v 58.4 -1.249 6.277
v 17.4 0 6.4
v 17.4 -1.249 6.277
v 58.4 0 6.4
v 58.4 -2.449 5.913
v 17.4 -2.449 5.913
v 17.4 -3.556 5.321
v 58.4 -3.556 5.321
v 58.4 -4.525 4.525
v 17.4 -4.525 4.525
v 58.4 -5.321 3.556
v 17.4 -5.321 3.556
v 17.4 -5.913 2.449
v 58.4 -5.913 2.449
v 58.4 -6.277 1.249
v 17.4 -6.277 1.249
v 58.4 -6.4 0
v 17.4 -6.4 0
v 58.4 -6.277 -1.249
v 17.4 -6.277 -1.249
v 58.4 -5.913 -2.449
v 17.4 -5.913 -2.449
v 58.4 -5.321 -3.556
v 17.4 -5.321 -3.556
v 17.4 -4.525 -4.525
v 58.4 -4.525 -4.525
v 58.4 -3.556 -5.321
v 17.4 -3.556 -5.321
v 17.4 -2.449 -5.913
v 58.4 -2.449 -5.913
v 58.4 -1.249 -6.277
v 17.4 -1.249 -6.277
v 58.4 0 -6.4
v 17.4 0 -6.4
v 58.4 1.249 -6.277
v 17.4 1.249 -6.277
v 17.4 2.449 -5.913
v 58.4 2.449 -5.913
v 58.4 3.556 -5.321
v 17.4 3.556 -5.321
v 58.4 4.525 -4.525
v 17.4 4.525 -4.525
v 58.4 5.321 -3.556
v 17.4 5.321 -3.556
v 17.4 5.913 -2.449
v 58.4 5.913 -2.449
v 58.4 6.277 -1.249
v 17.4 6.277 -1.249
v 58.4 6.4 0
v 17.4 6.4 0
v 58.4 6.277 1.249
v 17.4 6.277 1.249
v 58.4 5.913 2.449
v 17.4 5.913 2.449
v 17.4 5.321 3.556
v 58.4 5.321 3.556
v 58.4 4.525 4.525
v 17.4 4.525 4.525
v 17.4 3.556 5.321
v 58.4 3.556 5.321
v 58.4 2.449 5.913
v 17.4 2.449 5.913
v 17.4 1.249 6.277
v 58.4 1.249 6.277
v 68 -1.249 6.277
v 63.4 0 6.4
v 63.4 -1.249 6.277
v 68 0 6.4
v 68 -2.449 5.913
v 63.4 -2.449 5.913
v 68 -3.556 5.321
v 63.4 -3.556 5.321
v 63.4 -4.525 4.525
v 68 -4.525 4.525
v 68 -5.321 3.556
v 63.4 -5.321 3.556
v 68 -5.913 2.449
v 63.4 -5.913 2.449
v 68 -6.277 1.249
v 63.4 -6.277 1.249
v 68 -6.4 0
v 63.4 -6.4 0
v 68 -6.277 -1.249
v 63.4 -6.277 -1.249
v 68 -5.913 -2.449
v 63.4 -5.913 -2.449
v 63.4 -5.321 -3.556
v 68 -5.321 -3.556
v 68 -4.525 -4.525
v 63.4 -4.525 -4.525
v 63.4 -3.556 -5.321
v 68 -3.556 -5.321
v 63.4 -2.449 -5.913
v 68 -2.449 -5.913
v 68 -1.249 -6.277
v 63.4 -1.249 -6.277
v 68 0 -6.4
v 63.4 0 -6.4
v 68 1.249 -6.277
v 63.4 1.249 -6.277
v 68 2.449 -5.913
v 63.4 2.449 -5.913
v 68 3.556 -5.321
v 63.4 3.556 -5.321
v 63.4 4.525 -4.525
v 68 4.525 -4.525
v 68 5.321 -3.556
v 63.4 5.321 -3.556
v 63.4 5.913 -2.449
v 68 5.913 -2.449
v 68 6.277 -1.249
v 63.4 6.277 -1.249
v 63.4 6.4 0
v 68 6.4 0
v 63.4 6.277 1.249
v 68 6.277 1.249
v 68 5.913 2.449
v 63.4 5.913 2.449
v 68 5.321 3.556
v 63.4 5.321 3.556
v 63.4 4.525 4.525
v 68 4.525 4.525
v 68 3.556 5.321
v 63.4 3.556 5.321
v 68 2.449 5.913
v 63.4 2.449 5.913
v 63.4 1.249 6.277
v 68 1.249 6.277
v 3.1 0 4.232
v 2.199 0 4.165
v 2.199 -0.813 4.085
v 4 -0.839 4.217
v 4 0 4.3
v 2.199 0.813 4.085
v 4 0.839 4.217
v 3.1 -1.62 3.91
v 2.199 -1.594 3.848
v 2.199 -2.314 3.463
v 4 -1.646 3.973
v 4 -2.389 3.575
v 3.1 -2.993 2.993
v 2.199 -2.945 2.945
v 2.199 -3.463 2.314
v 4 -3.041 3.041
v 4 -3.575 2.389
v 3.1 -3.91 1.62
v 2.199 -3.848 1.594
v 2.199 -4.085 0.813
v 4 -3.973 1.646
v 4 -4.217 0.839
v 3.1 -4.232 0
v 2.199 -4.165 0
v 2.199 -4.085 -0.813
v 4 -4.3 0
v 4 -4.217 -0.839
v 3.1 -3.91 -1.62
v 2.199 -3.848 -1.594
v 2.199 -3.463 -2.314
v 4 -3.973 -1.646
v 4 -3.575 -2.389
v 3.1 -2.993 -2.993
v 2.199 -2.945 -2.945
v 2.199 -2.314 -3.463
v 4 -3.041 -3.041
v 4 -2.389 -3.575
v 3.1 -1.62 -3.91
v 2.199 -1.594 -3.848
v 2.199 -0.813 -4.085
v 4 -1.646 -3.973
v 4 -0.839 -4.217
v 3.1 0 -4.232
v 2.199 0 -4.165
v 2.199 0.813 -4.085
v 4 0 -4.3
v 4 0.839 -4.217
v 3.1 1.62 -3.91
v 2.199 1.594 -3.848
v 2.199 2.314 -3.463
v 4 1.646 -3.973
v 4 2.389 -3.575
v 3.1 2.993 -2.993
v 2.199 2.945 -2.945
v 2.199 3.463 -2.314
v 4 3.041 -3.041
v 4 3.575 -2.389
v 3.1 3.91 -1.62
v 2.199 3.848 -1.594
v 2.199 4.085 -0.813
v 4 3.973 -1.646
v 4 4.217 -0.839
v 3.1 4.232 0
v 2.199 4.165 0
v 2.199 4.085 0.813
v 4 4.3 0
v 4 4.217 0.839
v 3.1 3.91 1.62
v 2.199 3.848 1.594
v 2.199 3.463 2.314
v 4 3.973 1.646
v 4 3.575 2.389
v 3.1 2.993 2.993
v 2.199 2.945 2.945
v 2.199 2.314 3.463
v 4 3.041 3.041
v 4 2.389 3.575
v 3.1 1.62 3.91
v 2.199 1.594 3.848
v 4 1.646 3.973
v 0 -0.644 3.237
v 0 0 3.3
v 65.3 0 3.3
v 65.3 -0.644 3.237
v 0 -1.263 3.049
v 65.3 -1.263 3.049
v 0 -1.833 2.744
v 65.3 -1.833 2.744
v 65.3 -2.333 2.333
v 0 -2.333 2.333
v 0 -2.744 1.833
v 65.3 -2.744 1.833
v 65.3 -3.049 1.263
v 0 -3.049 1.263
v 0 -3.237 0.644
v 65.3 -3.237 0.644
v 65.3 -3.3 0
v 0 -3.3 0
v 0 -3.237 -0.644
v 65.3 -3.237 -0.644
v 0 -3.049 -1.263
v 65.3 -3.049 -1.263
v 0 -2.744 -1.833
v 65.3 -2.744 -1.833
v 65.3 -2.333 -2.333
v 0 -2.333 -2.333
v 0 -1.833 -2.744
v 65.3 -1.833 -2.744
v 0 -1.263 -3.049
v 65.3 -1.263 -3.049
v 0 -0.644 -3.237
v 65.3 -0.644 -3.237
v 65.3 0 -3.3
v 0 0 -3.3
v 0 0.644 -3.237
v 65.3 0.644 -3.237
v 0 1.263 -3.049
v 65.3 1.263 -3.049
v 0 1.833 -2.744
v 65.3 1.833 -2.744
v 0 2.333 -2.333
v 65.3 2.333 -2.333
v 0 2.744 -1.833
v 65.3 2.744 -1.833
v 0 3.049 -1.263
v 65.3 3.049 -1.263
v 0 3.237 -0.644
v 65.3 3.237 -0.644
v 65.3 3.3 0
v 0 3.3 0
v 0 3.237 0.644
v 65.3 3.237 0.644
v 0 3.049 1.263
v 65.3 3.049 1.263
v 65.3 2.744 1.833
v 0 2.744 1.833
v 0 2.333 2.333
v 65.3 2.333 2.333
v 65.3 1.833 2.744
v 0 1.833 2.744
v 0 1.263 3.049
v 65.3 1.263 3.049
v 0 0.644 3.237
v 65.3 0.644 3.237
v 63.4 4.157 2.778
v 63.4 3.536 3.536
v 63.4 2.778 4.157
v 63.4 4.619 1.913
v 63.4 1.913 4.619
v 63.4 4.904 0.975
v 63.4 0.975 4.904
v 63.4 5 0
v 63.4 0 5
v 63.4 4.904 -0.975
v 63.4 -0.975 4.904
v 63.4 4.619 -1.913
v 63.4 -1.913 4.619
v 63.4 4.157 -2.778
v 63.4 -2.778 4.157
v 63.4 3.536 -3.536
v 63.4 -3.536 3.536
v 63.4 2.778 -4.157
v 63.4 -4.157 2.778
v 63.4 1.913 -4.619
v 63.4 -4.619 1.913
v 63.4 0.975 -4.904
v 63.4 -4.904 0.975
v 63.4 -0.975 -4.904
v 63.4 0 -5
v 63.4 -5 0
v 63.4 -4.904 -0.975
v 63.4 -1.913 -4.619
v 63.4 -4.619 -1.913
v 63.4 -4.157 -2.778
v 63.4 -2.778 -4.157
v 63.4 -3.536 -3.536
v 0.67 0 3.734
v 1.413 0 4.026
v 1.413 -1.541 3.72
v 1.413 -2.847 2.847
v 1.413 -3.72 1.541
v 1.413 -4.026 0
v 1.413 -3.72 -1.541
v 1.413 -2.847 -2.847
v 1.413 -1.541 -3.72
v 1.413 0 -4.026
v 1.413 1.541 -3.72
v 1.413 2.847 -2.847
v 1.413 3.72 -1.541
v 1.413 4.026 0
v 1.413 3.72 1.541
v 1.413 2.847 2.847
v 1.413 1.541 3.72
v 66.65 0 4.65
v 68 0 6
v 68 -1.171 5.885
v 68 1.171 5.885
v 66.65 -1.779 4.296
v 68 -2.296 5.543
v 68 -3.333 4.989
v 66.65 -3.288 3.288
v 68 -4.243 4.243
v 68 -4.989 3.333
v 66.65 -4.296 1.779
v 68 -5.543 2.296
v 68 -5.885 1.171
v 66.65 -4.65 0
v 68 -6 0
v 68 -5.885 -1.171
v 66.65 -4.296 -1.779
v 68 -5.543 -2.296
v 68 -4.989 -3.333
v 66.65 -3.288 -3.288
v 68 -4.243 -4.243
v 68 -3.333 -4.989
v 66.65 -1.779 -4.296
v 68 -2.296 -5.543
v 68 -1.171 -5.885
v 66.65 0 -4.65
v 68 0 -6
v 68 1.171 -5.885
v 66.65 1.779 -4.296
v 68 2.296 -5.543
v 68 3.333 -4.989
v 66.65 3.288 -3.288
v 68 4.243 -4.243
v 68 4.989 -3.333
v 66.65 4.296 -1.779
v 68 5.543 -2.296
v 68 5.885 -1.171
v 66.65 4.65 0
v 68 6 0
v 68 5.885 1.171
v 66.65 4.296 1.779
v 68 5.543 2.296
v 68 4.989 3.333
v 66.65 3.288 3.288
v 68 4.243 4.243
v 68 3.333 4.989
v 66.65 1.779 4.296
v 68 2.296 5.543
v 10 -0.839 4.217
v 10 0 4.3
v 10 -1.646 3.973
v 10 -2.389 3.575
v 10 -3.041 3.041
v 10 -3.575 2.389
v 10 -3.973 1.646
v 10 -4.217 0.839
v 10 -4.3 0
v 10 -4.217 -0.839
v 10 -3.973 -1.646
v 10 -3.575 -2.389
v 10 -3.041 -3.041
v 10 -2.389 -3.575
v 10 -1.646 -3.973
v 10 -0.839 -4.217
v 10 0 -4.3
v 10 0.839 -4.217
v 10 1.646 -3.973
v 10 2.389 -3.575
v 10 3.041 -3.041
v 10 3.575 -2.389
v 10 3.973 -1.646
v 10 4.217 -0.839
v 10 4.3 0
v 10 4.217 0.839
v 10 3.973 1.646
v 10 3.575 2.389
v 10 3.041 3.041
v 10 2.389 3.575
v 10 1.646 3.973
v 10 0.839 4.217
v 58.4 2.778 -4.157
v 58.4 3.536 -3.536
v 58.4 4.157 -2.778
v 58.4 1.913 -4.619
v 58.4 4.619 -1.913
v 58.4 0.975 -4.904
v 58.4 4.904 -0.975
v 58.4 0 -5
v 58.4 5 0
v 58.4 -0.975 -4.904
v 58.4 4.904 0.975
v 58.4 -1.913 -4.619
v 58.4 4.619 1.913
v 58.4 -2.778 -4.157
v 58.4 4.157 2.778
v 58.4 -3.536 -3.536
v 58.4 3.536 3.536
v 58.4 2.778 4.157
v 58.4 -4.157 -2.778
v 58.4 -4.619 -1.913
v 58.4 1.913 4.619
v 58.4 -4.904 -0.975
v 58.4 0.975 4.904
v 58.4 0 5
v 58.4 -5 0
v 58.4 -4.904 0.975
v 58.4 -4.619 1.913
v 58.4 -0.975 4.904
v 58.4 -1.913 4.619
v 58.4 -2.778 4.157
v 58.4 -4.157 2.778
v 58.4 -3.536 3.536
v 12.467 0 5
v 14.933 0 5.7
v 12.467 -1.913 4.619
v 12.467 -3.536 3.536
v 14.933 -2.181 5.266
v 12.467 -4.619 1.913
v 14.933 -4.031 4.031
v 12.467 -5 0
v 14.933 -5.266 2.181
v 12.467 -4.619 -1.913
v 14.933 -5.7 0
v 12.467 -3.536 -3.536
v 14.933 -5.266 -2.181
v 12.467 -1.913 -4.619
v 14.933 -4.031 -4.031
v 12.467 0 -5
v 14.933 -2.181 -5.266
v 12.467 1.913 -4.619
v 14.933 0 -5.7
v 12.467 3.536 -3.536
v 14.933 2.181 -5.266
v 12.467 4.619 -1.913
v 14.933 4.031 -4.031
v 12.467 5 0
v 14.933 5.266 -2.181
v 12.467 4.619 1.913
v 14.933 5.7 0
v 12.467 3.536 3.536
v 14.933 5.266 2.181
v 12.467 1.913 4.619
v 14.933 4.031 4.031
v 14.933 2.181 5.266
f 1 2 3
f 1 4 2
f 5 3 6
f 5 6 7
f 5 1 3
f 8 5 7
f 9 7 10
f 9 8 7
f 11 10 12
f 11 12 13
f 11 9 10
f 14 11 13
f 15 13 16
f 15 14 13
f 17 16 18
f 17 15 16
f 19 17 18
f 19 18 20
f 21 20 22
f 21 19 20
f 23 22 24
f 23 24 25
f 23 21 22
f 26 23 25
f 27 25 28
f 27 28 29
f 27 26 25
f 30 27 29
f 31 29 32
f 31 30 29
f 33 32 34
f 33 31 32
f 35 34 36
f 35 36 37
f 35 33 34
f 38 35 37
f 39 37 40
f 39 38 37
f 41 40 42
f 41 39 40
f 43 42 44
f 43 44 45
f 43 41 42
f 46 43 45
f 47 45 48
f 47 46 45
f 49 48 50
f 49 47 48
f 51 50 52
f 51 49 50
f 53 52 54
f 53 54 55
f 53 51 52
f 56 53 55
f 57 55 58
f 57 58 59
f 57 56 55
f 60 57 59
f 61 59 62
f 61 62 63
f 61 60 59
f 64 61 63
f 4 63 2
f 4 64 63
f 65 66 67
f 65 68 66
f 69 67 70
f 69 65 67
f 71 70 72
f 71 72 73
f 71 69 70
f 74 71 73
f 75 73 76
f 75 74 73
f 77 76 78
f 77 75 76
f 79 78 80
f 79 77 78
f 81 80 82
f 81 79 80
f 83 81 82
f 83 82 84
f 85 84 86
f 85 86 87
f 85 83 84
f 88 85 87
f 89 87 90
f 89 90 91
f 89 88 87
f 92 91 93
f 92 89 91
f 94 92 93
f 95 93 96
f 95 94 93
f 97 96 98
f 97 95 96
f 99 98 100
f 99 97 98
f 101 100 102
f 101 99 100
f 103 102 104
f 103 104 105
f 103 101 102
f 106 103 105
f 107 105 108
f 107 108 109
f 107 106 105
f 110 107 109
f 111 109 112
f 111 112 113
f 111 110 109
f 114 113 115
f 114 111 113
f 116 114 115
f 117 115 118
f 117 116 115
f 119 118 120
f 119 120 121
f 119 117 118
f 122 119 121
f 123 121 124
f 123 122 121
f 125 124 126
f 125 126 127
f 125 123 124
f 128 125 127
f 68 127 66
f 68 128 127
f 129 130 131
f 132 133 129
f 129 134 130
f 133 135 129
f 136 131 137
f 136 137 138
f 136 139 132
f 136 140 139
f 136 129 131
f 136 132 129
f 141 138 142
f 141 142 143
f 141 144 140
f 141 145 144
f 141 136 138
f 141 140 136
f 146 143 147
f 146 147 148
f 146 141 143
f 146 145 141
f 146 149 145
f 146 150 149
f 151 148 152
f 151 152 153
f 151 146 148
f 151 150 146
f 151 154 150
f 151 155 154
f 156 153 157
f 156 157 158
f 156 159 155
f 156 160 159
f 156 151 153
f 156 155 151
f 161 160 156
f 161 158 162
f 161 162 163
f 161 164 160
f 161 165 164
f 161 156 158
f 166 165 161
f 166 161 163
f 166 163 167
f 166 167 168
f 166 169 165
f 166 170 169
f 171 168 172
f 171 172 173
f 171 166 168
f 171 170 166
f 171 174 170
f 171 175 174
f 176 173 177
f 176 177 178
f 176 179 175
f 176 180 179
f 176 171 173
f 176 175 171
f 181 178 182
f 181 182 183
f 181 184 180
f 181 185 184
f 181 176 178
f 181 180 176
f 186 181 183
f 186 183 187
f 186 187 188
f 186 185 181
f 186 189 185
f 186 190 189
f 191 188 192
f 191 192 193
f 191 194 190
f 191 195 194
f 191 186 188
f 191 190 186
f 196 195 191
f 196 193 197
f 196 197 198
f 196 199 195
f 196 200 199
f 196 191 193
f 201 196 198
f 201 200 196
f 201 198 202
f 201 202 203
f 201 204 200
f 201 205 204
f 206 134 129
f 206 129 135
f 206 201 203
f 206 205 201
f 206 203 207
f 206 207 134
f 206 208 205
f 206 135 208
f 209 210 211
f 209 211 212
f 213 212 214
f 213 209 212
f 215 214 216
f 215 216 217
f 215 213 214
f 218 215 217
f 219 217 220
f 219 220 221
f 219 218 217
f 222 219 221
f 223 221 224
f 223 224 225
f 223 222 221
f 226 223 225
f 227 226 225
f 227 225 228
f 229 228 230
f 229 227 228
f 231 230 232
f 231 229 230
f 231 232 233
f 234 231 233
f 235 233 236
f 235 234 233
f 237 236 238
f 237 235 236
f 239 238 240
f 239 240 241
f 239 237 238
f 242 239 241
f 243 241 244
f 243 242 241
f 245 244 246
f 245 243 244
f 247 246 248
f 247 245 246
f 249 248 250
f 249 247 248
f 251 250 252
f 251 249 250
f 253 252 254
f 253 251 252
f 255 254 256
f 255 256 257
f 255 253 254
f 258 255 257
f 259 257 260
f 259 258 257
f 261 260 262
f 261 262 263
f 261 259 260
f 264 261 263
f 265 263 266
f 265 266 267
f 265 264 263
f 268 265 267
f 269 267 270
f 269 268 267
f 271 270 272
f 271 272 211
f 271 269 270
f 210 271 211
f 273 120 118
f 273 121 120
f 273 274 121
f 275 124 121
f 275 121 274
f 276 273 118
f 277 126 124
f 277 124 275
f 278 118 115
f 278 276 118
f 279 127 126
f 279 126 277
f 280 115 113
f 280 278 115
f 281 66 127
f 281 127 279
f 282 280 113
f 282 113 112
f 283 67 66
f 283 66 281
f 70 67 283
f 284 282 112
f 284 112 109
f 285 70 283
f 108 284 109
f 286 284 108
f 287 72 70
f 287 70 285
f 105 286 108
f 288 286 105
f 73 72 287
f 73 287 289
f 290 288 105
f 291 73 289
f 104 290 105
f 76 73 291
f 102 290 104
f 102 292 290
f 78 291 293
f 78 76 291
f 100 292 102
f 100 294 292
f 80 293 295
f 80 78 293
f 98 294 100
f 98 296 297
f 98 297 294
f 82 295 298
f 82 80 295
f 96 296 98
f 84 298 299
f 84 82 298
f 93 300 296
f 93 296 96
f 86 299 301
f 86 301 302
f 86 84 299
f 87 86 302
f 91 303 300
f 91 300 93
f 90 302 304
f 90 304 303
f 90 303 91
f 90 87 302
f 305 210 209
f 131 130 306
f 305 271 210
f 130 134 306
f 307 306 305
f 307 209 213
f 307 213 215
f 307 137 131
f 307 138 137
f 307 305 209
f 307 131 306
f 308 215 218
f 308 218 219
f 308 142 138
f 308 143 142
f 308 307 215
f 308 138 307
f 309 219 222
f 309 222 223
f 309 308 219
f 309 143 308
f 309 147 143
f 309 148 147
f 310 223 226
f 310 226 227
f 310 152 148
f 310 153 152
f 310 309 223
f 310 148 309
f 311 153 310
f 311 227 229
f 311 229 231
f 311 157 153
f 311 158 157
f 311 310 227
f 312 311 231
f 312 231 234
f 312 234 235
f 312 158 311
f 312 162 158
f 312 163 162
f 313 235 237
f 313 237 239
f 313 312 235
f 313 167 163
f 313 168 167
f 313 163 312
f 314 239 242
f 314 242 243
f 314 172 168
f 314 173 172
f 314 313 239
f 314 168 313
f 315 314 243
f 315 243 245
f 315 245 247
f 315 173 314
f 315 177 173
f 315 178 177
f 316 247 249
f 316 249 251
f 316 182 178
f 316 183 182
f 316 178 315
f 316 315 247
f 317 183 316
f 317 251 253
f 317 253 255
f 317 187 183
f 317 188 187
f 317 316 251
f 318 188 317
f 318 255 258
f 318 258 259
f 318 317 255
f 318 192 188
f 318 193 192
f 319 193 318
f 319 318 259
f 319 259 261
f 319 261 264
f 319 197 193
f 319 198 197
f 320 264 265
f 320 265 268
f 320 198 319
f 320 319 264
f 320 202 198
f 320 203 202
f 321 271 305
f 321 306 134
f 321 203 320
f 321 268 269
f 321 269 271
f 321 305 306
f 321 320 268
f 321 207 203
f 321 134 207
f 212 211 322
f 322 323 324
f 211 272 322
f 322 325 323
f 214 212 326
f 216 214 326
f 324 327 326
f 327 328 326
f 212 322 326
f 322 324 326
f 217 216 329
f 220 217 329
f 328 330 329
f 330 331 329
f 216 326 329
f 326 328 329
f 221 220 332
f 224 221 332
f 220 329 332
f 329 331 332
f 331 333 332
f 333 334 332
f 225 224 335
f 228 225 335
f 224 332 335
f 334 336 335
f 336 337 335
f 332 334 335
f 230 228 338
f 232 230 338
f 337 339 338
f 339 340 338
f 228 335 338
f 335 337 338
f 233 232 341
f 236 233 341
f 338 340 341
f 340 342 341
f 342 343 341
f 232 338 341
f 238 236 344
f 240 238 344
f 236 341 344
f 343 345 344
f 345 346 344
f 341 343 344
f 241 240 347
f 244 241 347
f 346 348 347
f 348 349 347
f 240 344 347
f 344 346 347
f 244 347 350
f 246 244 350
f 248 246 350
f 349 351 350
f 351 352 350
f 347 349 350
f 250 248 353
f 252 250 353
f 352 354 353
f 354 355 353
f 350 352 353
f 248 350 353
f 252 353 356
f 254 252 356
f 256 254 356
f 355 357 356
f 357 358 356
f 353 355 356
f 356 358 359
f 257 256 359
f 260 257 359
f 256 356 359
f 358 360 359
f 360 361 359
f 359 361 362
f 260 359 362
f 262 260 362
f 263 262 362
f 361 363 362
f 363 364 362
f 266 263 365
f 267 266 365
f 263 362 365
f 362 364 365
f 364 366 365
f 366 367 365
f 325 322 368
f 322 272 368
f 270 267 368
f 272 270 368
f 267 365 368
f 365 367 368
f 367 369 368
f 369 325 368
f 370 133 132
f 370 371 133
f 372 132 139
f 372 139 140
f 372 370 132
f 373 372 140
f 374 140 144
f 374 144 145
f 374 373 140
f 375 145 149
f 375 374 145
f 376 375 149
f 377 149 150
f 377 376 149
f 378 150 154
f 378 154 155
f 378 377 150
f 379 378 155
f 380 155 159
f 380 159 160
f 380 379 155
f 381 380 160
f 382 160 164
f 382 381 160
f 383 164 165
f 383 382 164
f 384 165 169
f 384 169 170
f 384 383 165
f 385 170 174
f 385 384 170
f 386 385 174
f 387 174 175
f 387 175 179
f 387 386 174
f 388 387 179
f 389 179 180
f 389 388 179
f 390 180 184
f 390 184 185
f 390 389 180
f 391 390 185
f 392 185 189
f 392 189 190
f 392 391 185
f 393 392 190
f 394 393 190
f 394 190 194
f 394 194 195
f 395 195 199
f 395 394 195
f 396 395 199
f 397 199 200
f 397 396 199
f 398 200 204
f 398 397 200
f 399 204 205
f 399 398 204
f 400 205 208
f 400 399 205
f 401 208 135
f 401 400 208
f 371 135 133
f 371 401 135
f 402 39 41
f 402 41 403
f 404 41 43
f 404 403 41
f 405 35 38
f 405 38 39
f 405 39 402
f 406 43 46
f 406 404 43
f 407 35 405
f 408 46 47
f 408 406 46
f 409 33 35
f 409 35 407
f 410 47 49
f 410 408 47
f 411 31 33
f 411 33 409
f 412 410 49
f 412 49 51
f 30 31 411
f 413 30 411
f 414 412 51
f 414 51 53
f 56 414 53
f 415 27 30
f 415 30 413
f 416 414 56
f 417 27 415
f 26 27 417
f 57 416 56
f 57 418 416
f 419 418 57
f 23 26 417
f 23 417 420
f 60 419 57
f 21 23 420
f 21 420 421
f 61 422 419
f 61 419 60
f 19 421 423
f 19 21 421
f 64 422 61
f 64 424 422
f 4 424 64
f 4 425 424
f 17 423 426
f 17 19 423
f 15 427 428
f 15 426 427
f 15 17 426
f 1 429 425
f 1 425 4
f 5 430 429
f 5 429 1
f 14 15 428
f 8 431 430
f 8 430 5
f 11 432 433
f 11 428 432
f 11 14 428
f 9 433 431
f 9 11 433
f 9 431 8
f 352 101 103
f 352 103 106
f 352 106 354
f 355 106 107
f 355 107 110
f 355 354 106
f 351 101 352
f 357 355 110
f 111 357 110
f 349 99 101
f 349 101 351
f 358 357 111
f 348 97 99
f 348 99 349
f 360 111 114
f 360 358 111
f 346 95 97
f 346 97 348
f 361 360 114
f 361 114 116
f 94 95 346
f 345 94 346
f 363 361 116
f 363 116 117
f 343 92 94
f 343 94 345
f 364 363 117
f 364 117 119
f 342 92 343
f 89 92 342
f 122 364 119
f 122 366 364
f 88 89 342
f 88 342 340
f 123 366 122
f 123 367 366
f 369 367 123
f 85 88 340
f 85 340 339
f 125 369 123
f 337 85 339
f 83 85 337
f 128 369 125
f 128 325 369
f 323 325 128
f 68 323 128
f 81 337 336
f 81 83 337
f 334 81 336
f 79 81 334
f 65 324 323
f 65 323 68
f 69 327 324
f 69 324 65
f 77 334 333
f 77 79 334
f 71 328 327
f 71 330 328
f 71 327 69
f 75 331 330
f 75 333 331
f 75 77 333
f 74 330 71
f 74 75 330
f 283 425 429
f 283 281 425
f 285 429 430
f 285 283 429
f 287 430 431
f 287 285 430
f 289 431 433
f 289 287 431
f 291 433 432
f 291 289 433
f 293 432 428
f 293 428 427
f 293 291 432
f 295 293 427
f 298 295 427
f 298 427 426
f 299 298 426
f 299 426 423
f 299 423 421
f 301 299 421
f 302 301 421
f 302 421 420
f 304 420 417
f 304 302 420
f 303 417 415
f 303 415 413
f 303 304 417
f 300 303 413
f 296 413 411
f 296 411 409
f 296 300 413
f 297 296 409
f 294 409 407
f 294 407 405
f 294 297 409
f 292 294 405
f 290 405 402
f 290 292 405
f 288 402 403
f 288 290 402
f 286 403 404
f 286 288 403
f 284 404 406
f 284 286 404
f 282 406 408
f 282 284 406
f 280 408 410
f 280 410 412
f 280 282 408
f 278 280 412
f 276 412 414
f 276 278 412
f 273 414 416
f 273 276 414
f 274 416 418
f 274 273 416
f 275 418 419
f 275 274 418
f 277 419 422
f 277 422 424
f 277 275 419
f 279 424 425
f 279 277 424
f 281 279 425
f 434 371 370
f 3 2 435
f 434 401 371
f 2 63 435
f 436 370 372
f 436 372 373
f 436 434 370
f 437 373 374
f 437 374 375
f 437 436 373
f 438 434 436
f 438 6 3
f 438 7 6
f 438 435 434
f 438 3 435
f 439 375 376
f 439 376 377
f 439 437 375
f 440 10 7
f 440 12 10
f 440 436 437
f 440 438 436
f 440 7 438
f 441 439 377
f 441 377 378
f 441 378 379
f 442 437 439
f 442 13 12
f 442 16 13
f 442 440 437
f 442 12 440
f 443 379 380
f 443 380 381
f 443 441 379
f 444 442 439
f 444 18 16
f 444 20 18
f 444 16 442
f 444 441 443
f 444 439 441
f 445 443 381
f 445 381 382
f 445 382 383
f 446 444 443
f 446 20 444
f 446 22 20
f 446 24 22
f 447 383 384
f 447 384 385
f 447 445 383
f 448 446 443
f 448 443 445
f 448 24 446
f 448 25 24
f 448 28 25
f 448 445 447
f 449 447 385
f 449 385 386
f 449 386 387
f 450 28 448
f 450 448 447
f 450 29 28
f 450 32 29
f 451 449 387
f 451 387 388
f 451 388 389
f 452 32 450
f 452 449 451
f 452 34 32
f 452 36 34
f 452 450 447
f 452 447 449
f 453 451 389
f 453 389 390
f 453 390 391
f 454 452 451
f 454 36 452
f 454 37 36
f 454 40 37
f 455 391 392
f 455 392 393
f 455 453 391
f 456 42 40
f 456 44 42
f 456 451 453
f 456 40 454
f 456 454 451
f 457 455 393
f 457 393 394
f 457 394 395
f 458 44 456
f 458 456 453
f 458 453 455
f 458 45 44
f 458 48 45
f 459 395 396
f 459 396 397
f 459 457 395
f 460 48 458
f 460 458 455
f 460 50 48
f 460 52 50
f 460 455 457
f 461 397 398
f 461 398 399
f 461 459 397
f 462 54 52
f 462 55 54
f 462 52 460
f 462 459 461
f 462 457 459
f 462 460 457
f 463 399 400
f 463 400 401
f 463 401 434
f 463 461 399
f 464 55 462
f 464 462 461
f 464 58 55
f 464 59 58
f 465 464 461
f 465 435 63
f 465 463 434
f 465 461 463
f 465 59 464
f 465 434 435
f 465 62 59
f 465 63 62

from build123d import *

# Parameters (mm, degrees)
FILETE3_R     = 4
CHANFRO7_SIZE = 2.7


with BuildPart() as part:
    # Esboço1 → Revolução1 (revolve)
    with BuildSketch(Plane.XY, mode=Mode.PRIVATE) as revolu_o1_sk:
        Polygon((0, 3.3), (0, 4), (4, 4.3), (10, 4.3), (17.4, 6.4), (58.4, 6.4), (58.4, 5), (63.4, 5), (63.4, 6.4), (68, 6.4), (68, 3.3), align=None)
    revolve(revolu_o1_sk.sketch.rotate(Axis((0, 0, 0), (1, 0, 0)), 90), axis=Axis((0, 0, 0), (1, 0, 0)))

    # Filete3
    # the kernel refuses this fillet: 4 mm, written as the material it takes off along each edge
    with BuildSketch(Plane(origin=(0, 0, 0), x_dir=(0, 0, 1), z_dir=(0, 1, 0))) as filete3_piece_1:
        with BuildLine():
            CenterArc((0.176138028, 2.498296696), FILETE3_R, 321.349060222, 34.361786449)
            Line((4.164935268, 2.199136903), (4.244711213, 2.193153707))
            Line((4.244711213, 2.193153707), (4.079775945, -0.005983196))
            Line((4.079775945, -0.005983196), (4, -0.08))
            ThreePointArc((4, -0.08), (3.65, -0.08), (3.362477239, -0.049965934))
            Line((3.362477239, -0.049965934), (3.3, 0))
        make_face()
    revolve(axis=Axis((0, 0, 0), (1, 0, 0)), mode=Mode.SUBTRACT)

    # Chanfro7
    chanfro7_edges = [part.edges().sort_by_distance(p)[0] for p in [
        (68, 0, -3.3),
    ]]
    chamfer(chanfro7_edges, length=CHANFRO7_SIZE)


solid = part.part
